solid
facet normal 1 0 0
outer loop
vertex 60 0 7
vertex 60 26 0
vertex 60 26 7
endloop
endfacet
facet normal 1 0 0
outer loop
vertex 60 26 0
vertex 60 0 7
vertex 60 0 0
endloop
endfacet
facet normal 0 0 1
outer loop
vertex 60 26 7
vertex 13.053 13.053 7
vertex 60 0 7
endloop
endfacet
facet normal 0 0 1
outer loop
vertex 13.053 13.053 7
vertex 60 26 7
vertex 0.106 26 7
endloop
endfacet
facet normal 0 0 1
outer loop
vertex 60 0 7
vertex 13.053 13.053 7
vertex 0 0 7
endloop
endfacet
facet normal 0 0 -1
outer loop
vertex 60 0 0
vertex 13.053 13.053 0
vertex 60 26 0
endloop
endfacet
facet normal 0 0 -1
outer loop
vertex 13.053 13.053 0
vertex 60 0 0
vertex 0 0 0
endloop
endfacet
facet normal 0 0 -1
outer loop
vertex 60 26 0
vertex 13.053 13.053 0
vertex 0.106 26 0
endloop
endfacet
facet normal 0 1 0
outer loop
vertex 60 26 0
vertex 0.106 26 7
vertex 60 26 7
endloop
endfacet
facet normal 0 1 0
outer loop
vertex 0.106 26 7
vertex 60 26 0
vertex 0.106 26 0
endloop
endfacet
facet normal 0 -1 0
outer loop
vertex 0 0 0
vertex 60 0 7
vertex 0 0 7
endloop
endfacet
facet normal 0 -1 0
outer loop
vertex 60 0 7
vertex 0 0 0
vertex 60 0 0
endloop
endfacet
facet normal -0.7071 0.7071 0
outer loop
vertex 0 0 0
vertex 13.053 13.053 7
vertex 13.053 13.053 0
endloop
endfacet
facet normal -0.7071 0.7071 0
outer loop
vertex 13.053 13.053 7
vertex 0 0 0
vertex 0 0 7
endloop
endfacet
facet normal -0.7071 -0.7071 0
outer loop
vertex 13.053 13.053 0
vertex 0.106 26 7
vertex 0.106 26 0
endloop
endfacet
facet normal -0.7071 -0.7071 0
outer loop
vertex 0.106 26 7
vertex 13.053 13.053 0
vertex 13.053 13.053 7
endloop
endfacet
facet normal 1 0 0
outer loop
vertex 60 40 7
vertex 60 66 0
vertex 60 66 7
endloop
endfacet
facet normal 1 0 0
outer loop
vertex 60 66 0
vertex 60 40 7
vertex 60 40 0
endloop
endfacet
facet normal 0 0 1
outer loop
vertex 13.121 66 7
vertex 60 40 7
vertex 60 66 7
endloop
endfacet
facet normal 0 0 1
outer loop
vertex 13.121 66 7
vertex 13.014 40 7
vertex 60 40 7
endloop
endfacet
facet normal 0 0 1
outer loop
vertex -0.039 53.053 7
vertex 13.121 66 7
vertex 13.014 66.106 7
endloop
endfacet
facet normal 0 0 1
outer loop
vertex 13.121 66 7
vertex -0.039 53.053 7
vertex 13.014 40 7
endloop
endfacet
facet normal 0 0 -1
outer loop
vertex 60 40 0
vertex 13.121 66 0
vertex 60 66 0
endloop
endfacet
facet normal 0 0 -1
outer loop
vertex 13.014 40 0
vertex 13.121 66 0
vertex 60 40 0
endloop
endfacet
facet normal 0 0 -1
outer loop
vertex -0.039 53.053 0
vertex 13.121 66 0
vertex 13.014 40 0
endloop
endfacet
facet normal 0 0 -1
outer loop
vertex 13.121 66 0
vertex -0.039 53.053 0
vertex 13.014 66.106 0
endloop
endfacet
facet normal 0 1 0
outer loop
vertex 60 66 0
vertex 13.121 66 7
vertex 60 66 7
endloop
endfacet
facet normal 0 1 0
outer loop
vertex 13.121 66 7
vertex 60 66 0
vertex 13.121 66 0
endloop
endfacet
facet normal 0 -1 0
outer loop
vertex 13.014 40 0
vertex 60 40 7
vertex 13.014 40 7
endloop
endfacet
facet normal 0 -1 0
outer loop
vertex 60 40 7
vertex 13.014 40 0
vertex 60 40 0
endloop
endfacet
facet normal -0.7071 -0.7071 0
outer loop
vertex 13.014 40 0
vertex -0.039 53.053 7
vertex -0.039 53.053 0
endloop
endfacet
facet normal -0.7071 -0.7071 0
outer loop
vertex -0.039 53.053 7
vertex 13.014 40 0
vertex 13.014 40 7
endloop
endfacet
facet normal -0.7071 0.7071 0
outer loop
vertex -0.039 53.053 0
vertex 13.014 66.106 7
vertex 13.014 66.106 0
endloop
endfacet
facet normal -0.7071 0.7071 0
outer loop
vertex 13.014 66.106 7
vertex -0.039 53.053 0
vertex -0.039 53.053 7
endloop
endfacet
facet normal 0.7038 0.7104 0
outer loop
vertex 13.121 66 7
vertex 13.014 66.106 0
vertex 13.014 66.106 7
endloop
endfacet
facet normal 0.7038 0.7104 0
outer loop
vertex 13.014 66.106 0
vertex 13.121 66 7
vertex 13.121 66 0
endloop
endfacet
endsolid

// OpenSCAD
//Азотистые основания:
x=60;
y=26;
z=7;
t=40;
edge=0.71*y;
dx=edge*1.41;
//Аденин
difference (){
  color("Lime") translate ([0,0,0]) cube ([x,y,z]);
  rotate ([0,0,45]) translate ([0,0,-1]) cube ([edge,edge,z+2]);
}

//Тимин
translate ([dx/2,t,0]){
  color("Lime") translate ([0,0,0]) cube ([x-dx/2,y,z]);
  rotate ([0,0,45]) cube ([edge,edge,z]);
}
//Связи между основаниями
//color("Orange") translate ([90,4,5]) rotate([0,90,0]) cylinder (55,4,4);
//color("Orange") translate ([90,31,5]) rotate([0,90,0]) cylinder (55,4,4);
//color("Orange") translate ([75,17,5]) rotate([0,90,0]) cylinder (55,4,4);
